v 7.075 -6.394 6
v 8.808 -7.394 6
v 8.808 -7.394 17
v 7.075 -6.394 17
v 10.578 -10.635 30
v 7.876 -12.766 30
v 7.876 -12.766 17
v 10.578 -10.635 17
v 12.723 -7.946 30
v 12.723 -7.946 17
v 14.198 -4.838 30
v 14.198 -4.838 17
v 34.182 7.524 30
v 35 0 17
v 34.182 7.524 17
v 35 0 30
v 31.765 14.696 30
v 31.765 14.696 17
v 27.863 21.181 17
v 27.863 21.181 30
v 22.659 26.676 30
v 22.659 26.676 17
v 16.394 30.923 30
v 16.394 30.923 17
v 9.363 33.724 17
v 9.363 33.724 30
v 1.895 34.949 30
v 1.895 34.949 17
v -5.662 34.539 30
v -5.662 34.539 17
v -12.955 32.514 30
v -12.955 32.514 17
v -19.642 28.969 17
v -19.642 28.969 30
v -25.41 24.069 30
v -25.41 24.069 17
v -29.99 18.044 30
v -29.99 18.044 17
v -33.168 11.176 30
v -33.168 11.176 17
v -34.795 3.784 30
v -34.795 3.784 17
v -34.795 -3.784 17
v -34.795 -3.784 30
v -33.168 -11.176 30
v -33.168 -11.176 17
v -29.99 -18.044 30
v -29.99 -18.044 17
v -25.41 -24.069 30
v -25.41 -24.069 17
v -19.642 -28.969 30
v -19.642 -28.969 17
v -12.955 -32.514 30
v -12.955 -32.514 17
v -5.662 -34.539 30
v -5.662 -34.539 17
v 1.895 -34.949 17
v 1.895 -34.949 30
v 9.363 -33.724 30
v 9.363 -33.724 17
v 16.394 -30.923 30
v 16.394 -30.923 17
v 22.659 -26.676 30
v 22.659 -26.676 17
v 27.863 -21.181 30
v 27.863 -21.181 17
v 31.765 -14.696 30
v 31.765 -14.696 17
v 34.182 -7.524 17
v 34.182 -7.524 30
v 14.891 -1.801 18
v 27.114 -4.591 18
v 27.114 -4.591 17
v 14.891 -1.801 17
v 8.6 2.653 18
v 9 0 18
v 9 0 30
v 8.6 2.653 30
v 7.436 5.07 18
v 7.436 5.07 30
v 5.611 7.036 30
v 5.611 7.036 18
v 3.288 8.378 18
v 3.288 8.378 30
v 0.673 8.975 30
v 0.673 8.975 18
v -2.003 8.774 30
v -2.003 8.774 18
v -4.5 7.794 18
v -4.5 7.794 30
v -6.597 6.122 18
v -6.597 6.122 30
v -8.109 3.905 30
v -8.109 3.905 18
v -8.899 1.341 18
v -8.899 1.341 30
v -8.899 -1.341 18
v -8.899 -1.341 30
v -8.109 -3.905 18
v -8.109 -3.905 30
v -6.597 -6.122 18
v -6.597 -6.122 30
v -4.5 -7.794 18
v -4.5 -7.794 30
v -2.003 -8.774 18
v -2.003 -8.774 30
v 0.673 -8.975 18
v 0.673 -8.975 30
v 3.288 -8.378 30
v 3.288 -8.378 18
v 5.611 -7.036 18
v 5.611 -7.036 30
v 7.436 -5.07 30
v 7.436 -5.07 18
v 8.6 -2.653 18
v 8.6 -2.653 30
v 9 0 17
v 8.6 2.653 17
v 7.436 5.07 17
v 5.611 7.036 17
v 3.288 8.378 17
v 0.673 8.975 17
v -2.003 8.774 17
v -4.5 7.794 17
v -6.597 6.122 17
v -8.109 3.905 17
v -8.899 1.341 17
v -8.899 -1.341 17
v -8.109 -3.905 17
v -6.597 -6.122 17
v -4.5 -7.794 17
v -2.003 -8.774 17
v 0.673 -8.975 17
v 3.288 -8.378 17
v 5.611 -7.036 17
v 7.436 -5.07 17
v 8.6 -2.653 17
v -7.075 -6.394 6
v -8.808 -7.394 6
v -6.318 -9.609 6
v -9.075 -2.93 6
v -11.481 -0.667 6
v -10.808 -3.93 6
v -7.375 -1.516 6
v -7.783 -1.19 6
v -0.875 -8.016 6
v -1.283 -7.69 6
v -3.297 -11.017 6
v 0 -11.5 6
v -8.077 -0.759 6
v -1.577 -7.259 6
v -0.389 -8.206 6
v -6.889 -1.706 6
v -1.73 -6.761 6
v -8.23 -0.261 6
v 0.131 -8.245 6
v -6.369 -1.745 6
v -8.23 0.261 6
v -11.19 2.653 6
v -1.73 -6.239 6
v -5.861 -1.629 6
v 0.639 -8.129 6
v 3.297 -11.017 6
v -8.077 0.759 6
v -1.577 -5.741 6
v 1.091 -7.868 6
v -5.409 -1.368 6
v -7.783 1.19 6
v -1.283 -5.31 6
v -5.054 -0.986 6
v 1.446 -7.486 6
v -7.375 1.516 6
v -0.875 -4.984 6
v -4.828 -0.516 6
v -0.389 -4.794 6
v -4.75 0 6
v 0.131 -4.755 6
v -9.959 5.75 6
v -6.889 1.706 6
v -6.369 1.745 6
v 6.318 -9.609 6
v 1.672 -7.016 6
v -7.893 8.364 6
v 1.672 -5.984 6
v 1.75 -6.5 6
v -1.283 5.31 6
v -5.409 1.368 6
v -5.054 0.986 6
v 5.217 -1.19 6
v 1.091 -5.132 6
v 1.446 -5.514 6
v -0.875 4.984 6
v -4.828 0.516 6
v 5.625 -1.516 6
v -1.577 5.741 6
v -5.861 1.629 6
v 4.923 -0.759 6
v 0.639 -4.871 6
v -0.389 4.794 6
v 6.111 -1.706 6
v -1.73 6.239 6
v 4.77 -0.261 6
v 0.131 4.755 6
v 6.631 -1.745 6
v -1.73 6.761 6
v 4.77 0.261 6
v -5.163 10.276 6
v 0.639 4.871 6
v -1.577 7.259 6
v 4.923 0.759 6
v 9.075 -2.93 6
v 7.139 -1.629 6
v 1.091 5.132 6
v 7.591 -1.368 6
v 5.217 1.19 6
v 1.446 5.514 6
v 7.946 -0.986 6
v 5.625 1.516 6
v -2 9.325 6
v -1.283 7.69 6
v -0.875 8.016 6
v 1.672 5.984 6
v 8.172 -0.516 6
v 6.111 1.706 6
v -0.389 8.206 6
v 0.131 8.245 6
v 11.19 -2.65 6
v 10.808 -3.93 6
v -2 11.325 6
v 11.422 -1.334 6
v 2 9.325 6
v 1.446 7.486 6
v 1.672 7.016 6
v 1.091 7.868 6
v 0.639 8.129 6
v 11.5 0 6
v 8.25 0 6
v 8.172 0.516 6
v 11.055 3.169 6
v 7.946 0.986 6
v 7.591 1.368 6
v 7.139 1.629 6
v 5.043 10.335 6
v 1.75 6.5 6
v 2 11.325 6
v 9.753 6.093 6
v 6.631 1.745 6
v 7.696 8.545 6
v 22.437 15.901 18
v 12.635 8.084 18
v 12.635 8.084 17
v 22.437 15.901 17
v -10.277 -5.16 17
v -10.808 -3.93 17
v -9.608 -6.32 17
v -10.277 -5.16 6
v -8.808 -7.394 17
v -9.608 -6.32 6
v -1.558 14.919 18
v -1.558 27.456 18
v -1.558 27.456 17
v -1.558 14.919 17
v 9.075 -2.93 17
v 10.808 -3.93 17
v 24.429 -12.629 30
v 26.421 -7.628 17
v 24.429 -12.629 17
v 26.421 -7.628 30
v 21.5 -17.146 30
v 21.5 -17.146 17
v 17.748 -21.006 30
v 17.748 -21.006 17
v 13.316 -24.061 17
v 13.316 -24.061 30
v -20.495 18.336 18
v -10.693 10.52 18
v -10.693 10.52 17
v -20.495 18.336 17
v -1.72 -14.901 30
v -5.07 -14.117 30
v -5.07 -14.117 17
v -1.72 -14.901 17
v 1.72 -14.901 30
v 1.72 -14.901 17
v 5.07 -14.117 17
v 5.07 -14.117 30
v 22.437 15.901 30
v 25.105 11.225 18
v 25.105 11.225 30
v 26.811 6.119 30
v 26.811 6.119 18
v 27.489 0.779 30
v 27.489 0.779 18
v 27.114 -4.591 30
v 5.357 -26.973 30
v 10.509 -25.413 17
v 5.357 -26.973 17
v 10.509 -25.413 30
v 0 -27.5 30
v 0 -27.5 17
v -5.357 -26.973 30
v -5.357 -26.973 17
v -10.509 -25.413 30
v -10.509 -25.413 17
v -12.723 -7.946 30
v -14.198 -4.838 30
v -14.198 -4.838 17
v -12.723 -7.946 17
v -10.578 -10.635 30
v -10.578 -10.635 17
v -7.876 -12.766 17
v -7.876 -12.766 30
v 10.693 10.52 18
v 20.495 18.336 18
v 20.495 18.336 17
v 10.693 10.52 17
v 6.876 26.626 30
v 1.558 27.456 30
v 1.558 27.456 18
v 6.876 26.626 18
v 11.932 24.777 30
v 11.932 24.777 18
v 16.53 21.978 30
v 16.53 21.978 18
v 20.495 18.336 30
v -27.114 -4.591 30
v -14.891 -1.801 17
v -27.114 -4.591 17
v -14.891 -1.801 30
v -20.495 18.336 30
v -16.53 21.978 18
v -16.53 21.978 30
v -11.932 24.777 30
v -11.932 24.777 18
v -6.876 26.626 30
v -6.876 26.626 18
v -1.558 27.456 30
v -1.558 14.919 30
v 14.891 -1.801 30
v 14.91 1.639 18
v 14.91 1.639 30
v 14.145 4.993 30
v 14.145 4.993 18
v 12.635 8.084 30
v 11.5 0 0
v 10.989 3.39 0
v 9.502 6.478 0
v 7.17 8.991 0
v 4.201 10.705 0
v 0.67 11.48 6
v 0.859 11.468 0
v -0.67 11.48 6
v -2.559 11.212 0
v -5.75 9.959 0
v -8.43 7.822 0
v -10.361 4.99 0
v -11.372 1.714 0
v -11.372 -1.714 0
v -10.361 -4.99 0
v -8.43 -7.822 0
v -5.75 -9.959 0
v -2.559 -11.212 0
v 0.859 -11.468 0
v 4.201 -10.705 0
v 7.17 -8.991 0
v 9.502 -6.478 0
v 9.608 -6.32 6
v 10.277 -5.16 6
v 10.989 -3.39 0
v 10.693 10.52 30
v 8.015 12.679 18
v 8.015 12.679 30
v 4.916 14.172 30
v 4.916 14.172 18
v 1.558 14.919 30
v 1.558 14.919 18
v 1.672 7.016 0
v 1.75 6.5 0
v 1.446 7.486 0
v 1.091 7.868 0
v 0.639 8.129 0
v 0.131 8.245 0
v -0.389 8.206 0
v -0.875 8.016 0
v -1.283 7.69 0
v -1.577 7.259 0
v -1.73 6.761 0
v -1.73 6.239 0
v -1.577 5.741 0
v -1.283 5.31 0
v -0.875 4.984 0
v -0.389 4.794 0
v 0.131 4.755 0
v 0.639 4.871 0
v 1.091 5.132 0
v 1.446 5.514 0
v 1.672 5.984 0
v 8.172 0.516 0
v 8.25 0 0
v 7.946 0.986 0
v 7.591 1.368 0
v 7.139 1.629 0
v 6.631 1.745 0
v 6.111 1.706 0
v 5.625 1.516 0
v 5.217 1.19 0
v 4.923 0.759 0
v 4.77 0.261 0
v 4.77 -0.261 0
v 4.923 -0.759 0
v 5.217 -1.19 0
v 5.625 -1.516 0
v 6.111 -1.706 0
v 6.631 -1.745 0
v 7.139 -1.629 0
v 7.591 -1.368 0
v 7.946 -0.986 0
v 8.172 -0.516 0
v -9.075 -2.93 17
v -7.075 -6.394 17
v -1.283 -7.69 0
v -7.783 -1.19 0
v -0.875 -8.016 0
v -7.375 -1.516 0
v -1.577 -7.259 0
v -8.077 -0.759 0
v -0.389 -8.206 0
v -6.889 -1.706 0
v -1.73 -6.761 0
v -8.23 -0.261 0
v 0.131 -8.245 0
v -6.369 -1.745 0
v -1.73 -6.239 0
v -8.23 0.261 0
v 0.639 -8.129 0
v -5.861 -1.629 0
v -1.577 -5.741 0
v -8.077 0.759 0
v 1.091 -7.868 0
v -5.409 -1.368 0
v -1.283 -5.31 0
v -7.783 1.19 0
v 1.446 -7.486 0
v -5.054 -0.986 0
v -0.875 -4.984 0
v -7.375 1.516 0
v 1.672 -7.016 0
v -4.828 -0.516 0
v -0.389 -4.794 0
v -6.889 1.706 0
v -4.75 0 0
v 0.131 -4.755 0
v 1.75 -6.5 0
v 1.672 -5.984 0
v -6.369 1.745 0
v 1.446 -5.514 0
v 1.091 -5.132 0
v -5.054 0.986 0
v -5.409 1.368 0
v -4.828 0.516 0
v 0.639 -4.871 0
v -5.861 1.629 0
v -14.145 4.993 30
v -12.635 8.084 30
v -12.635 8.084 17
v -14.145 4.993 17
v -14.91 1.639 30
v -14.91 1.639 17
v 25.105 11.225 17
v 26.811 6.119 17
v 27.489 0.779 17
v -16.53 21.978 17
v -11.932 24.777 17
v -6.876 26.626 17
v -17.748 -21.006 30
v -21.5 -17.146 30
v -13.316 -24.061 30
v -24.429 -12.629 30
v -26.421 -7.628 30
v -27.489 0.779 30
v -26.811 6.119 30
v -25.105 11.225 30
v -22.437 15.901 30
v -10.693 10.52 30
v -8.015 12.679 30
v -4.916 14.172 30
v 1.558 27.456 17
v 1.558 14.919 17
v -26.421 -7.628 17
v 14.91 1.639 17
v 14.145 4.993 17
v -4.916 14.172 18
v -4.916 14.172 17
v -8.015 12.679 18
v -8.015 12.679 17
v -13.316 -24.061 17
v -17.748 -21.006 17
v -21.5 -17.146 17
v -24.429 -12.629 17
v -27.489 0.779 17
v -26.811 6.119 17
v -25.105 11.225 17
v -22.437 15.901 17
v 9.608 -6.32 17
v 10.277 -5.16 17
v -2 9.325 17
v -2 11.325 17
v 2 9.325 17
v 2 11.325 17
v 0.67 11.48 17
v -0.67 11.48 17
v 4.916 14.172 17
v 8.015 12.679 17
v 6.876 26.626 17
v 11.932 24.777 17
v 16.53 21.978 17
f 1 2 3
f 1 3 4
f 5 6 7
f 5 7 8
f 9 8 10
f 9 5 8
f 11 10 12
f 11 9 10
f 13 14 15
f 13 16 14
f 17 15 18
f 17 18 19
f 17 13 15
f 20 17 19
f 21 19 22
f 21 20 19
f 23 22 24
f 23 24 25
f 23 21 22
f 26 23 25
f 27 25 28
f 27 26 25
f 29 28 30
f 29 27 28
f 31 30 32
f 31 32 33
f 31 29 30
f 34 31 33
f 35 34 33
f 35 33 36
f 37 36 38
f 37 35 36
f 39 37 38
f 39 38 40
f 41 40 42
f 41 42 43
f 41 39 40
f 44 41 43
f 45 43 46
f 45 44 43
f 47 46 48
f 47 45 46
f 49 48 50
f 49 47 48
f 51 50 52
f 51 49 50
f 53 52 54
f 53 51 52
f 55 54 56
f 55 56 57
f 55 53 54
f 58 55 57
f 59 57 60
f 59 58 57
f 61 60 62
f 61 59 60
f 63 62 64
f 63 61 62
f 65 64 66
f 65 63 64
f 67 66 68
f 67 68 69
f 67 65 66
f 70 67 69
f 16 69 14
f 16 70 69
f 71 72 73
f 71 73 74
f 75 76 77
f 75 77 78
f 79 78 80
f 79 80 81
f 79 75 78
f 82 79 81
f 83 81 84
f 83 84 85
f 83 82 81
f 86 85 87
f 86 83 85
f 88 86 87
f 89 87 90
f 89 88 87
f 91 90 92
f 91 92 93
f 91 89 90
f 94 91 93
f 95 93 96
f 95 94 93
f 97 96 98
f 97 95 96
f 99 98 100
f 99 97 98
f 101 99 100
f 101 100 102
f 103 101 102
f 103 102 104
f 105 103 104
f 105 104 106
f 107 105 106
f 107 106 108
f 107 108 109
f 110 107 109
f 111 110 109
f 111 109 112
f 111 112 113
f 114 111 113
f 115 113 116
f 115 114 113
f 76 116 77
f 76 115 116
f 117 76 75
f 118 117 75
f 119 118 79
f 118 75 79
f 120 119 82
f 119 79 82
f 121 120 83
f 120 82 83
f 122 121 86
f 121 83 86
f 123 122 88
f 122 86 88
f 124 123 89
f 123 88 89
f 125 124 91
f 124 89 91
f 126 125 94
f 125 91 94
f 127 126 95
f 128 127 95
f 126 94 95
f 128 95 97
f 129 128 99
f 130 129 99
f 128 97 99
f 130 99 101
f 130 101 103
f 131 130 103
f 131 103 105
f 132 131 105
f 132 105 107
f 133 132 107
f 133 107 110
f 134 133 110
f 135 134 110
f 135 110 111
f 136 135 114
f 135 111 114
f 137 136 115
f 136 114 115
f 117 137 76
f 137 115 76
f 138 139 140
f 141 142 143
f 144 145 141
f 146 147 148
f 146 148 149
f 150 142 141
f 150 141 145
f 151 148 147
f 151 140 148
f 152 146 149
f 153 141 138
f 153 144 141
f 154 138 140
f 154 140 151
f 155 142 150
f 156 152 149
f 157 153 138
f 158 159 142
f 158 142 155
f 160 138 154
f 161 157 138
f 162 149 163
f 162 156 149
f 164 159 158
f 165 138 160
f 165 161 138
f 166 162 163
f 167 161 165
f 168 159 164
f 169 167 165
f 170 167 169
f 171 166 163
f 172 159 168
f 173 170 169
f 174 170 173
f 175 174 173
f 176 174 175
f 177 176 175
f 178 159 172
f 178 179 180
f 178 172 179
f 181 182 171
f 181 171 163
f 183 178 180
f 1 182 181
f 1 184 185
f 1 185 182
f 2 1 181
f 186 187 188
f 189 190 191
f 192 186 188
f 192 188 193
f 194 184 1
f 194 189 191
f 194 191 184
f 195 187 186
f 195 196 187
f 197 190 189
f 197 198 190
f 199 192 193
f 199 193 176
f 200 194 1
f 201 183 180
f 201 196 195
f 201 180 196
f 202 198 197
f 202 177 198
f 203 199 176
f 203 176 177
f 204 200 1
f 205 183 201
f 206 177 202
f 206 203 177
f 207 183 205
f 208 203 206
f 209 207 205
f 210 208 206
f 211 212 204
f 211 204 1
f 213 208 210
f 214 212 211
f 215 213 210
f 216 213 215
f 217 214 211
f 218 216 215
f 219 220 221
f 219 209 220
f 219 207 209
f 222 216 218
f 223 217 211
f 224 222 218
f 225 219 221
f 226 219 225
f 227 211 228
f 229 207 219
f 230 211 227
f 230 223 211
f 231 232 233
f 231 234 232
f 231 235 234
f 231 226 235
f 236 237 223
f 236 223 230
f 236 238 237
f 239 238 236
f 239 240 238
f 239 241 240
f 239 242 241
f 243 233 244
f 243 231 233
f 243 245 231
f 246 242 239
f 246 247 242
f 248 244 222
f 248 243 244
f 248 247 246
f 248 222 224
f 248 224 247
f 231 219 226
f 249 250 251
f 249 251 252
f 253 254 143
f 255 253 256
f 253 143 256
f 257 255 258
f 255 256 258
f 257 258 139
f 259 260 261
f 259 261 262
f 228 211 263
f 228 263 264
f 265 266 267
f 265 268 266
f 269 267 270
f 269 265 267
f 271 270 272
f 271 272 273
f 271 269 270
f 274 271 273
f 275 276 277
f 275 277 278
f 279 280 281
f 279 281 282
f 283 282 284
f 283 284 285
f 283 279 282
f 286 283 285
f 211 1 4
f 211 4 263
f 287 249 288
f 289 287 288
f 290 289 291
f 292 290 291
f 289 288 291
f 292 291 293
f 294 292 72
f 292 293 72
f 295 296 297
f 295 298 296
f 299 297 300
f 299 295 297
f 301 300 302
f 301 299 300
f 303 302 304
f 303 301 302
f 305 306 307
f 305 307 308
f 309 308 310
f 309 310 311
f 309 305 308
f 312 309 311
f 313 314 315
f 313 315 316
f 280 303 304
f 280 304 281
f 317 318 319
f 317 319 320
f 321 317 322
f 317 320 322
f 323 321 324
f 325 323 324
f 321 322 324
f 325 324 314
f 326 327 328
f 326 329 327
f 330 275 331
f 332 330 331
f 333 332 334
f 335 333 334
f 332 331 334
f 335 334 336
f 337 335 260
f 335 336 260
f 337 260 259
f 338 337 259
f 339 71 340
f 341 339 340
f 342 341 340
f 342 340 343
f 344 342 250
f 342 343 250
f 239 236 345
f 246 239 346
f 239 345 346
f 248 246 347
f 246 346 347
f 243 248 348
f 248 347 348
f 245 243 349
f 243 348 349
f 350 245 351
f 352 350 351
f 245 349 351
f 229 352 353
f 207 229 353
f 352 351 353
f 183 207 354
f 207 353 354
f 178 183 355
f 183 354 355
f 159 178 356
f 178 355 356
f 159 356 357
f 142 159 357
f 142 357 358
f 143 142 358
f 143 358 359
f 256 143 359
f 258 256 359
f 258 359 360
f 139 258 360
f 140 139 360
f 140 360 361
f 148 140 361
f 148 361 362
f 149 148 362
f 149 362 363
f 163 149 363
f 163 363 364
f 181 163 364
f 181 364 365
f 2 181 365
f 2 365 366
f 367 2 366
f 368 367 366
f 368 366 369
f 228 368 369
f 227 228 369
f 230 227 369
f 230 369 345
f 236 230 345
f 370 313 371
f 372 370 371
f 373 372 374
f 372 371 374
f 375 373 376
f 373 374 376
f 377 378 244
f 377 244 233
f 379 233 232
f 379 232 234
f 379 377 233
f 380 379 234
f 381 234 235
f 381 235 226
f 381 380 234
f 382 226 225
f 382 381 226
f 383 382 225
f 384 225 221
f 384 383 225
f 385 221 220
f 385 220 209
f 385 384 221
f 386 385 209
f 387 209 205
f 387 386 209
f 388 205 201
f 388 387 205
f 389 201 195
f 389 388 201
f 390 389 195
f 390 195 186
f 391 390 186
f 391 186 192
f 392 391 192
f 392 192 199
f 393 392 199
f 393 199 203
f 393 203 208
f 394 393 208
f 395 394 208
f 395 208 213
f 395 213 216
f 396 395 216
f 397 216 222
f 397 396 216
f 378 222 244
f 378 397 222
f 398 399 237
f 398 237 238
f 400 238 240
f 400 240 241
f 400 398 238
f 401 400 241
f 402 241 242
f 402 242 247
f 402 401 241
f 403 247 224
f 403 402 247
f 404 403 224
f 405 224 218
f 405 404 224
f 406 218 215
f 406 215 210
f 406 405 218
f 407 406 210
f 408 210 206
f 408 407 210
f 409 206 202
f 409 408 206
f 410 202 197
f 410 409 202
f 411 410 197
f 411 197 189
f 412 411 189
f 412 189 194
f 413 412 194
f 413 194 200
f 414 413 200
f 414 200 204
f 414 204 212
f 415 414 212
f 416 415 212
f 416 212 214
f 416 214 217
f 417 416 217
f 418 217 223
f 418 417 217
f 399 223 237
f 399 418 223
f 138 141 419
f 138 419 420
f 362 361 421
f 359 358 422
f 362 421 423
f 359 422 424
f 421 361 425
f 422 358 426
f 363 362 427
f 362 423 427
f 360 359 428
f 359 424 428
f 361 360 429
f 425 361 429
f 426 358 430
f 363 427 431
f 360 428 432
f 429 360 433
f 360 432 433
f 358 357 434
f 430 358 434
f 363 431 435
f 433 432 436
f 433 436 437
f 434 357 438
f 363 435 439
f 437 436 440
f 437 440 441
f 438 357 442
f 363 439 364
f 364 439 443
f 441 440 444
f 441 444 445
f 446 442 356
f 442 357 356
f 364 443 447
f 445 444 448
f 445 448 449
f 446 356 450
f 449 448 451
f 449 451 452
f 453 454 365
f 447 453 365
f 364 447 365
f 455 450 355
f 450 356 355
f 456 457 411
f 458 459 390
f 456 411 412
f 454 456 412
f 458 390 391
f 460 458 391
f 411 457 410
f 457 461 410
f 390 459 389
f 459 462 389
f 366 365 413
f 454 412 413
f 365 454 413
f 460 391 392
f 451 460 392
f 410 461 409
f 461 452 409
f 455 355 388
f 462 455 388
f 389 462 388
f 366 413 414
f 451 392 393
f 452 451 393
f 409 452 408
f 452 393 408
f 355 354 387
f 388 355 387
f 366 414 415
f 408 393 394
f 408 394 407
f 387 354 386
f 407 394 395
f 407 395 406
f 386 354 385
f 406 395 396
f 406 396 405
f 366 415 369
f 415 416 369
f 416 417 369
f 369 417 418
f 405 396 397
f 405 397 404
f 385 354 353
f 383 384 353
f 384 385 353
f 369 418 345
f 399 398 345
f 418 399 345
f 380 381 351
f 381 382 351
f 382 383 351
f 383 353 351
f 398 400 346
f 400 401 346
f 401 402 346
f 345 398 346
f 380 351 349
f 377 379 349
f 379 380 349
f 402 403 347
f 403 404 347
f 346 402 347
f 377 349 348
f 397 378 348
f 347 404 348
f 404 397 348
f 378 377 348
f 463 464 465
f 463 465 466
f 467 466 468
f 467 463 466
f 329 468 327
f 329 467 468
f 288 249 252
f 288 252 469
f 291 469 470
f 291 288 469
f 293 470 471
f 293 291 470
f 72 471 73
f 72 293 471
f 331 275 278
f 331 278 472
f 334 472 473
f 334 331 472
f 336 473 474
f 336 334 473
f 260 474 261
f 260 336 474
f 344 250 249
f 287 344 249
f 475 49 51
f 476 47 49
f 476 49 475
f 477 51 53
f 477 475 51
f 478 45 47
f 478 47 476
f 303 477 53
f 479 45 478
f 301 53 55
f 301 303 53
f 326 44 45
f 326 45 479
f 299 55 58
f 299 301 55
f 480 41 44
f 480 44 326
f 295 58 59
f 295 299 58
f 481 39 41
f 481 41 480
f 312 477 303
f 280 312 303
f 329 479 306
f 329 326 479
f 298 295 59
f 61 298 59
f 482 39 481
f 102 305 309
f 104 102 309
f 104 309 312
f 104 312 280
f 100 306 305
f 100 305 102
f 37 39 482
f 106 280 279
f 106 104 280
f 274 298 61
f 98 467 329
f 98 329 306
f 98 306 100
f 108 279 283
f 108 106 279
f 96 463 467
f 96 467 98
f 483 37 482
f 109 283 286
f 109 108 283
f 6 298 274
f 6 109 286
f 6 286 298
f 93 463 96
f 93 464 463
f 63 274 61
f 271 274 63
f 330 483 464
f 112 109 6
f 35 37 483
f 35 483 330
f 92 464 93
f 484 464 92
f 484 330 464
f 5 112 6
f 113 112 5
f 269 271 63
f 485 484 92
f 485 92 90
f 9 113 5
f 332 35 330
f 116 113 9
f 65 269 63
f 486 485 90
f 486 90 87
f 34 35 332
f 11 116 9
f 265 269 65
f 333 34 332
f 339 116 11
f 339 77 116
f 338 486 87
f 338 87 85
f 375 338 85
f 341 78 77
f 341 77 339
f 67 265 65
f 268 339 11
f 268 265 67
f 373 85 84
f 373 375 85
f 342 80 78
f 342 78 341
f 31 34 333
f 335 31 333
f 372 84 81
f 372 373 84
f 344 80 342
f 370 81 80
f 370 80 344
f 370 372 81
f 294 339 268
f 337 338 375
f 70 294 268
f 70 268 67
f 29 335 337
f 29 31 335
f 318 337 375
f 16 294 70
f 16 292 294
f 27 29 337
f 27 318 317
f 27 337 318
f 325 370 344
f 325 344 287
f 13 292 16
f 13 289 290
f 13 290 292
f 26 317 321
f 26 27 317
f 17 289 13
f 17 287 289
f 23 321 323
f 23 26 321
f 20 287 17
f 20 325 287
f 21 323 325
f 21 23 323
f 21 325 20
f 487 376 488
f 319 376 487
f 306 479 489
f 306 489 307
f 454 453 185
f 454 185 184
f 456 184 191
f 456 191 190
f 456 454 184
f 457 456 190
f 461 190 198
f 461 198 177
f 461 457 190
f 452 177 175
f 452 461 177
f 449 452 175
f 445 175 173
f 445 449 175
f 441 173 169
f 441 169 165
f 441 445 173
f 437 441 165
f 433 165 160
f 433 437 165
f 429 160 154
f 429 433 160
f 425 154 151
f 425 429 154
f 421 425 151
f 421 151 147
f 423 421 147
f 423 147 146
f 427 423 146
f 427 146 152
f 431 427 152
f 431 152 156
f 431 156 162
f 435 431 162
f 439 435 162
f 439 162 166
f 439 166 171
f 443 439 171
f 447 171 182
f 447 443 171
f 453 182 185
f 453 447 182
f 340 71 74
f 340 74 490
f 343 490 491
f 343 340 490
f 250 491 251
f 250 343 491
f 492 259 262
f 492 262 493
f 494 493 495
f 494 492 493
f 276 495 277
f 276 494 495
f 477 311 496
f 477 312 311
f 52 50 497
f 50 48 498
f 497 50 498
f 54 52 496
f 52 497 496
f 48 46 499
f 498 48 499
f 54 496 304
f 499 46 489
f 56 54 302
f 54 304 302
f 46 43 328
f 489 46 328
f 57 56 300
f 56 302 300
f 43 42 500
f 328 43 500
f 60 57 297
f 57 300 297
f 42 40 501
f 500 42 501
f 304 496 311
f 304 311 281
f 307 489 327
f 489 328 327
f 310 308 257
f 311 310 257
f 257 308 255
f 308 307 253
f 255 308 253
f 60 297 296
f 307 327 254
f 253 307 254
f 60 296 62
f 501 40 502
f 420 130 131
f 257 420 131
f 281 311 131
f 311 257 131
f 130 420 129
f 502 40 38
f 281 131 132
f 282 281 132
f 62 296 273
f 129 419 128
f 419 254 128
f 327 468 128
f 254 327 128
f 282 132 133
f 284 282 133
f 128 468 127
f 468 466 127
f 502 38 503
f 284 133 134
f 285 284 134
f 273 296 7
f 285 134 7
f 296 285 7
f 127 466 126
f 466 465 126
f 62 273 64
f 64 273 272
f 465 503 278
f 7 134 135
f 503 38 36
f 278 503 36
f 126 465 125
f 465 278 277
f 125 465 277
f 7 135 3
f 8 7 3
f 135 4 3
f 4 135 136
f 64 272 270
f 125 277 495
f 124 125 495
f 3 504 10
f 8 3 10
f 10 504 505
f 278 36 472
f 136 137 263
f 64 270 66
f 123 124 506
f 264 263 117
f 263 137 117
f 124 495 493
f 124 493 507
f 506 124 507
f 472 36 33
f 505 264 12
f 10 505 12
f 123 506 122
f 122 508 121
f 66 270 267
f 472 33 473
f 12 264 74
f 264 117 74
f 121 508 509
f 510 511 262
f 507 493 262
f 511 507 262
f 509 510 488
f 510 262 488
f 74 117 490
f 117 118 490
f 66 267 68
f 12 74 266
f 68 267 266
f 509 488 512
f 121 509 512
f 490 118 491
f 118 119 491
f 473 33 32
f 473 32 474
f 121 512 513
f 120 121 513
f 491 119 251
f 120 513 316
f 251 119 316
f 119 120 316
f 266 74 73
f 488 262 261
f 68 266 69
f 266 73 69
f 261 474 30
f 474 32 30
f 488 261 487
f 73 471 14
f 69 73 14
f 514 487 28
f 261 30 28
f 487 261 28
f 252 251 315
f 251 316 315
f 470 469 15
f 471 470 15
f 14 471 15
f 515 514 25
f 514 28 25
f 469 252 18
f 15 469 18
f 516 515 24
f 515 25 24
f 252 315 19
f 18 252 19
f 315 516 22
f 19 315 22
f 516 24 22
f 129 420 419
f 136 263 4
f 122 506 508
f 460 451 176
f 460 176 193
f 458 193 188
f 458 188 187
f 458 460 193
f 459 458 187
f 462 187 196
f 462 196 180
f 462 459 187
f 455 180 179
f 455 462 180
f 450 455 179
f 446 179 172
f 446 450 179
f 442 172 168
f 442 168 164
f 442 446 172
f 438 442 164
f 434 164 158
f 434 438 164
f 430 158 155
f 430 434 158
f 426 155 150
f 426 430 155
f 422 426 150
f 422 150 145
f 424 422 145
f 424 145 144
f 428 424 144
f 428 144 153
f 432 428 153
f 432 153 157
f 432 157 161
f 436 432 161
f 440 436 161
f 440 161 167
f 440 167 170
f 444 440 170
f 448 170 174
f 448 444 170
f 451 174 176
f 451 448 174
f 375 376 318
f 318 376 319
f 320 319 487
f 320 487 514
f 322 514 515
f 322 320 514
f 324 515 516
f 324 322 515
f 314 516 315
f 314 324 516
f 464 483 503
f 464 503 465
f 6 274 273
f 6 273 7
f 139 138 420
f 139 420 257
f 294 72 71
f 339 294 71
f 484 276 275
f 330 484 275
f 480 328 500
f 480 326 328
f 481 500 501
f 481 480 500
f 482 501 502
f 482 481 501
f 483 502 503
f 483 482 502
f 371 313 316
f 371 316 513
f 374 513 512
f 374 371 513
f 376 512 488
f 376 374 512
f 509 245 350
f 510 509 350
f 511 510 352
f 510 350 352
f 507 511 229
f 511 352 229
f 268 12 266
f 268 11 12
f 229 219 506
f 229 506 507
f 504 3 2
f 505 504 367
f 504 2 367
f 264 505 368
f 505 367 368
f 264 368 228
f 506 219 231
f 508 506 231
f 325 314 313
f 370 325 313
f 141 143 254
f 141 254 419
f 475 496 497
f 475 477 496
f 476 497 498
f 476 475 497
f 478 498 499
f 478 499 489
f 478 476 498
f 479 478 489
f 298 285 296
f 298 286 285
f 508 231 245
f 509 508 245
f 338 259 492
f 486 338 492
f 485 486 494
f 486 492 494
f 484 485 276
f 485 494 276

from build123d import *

# Parameters (mm, degrees)
SKETCH1_R                = 11.5
SKETCH1_R_2              = 1.75
BOSS_EXTRUDE2_DEPTH      = 6
SKETCH2_W                = 4
SKETCH2_H                = 2
BOSS_EXTRUDE3_DEPTH      = 12
SKETCH3_R                = 35
SKETCH3_R_2              = 9
BOSS_EXTRUDE5_DEPTH      = 12
BOSS_EXTRUDE5_DEPTH_BACK = 1


with BuildPart() as part:
    # Sketch1 → Boss-Extrude2 (new body)
    with BuildSketch(Plane.XY):
        Circle(SKETCH1_R)
        with Locations((0, 6.5)):
            Circle(SKETCH1_R_2, mode=Mode.SUBTRACT)
        with Locations((6.5, 0)):
            Circle(SKETCH1_R_2, mode=Mode.SUBTRACT)
        with Locations((0, -6.5)):
            Circle(SKETCH1_R_2, mode=Mode.SUBTRACT)
        with Locations((-6.5, 0)):
            Circle(SKETCH1_R_2, mode=Mode.SUBTRACT)
    extrude(amount=BOSS_EXTRUDE2_DEPTH)

    # Sketch2 → Boss-Extrude3 (add)
    with BuildSketch(Plane.XY.offset(6)):
        with Locations((0, 10.324751653)):
            Rectangle(SKETCH2_W, SKETCH2_H)
        with BuildLine():
            Line((-2, 11.324751653), (2, 11.324751653))
            ThreePointArc((2, 11.324751653), (0, 11.5), (-2, 11.324751653))
        make_face()
        with BuildLine():
            ThreePointArc((8.807522623, -7.394426634), (9.959292144, -5.75), (10.807522623, -3.930325019))
            Line((10.807522623, -3.930325019), (8.807522623, -7.394426634))
        make_face()
        Polygon((8.807522623, -7.394426634), (7.075471815, -6.394426634), (9.075471815, -2.930325019), (10.807522623, -3.930325019), align=None)
        with BuildLine():
            ThreePointArc((-10.807522623, -3.930325019), (-9.959292144, -5.75), (-8.807522623, -7.394426634))
            Line((-8.807522623, -7.394426634), (-10.807522623, -3.930325019))
        make_face()
        Polygon((-10.807522623, -3.930325019), (-9.075471815, -2.930325019), (-7.075471815, -6.394426634), (-8.807522623, -7.394426634), align=None)
    extrude(amount=BOSS_EXTRUDE3_DEPTH)

    # Sketch3 → Boss-Extrude5 (add, two sides)
    with BuildSketch(Plane.XY.offset(18)) as boss_extrude5_sk:
        Circle(SKETCH3_R)
        with BuildLine():
            Line((-1.55765655, 27.455850125), (-1.55765655, 14.918904319))
            ThreePointArc((-1.55765655, 14.918904319), (-6.508256087, 13.514533019), (-10.692886106, 10.519609628))
            Line((-10.692886106, 10.519609628), (-20.494665031, 18.336267484))
            ThreePointArc((-20.494665031, 18.336267484), (-11.931802826, 24.776643867), (-1.55765655, 27.455850125))
        make_face(mode=Mode.SUBTRACT)
        with BuildLine():
            Line((-22.437030979, 15.900617624), (-12.635252054, 8.083959768))
            ThreePointArc((-12.635252054, 8.083959768), (-14.623918683, 3.337814009), (-14.89146743, -1.801165674))
            Line((-14.89146743, -1.801165674), (-27.11408583, -4.590898564))
            ThreePointArc((-27.11408583, -4.590898564), (-26.810517585, 6.119325684), (-22.437030979, 15.900617624))
        make_face(mode=Mode.SUBTRACT)
        with BuildLine():
            Line((-26.420863449, -7.628104261), (-14.198245049, -4.838371371))
            ThreePointArc((-14.198245049, -4.838371371), (-11.727472237, -9.352347028), (-7.876470048, -12.765626486))
            Line((-7.876470048, -12.765626486), (-13.316046972, -24.061024356))
            ThreePointArc((-13.316046972, -24.061024356), (-21.500365768, -17.145969551), (-26.420863449, -7.628104261))
        make_face(mode=Mode.SUBTRACT)
        with BuildLine():
            Line((-10.509246854, -25.412708052), (-5.069669931, -14.117310183))
            ThreePointArc((-5.069669931, -14.117310183), (0, -15), (5.069669931, -14.117310183))
            Line((5.069669931, -14.117310183), (10.509246854, -25.412708052))
            ThreePointArc((10.509246854, -25.412708052), (0, -27.5), (-10.509246854, -25.412708052))
        make_face(mode=Mode.SUBTRACT)
        with BuildLine():
            Line((13.316046972, -24.061024356), (7.876470048, -12.765626486))
            ThreePointArc((7.876470048, -12.765626486), (11.727472237, -9.352347028), (14.198245049, -4.838371371))
            Line((14.198245049, -4.838371371), (26.420863449, -7.628104261))
            ThreePointArc((26.420863449, -7.628104261), (21.500365768, -17.145969551), (13.316046972, -24.061024356))
        make_face(mode=Mode.SUBTRACT)
        with BuildLine():
            Line((27.11408583, -4.590898564), (14.89146743, -1.801165674))
            ThreePointArc((14.89146743, -1.801165674), (14.623918683, 3.337814009), (12.635252054, 8.083959768))
            Line((12.635252054, 8.083959768), (22.437030979, 15.900617624))
            ThreePointArc((22.437030979, 15.900617624), (26.810517585, 6.119325684), (27.11408583, -4.590898564))
        make_face(mode=Mode.SUBTRACT)
        with BuildLine():
            Line((20.494665031, 18.336267484), (10.692886106, 10.519609628))
            ThreePointArc((10.692886106, 10.519609628), (6.508256087, 13.514533019), (1.55765655, 14.918904319))
            Line((1.55765655, 14.918904319), (1.55765655, 27.455850125))
            ThreePointArc((1.55765655, 27.455850125), (11.931802826, 24.776643867), (20.494665031, 18.336267484))
        make_face(mode=Mode.SUBTRACT)
        Circle(SKETCH3_R_2, mode=Mode.SUBTRACT)
    extrude(amount=BOSS_EXTRUDE5_DEPTH)
    extrude(boss_extrude5_sk.sketch, amount=-BOSS_EXTRUDE5_DEPTH_BACK)


solid = part.part
